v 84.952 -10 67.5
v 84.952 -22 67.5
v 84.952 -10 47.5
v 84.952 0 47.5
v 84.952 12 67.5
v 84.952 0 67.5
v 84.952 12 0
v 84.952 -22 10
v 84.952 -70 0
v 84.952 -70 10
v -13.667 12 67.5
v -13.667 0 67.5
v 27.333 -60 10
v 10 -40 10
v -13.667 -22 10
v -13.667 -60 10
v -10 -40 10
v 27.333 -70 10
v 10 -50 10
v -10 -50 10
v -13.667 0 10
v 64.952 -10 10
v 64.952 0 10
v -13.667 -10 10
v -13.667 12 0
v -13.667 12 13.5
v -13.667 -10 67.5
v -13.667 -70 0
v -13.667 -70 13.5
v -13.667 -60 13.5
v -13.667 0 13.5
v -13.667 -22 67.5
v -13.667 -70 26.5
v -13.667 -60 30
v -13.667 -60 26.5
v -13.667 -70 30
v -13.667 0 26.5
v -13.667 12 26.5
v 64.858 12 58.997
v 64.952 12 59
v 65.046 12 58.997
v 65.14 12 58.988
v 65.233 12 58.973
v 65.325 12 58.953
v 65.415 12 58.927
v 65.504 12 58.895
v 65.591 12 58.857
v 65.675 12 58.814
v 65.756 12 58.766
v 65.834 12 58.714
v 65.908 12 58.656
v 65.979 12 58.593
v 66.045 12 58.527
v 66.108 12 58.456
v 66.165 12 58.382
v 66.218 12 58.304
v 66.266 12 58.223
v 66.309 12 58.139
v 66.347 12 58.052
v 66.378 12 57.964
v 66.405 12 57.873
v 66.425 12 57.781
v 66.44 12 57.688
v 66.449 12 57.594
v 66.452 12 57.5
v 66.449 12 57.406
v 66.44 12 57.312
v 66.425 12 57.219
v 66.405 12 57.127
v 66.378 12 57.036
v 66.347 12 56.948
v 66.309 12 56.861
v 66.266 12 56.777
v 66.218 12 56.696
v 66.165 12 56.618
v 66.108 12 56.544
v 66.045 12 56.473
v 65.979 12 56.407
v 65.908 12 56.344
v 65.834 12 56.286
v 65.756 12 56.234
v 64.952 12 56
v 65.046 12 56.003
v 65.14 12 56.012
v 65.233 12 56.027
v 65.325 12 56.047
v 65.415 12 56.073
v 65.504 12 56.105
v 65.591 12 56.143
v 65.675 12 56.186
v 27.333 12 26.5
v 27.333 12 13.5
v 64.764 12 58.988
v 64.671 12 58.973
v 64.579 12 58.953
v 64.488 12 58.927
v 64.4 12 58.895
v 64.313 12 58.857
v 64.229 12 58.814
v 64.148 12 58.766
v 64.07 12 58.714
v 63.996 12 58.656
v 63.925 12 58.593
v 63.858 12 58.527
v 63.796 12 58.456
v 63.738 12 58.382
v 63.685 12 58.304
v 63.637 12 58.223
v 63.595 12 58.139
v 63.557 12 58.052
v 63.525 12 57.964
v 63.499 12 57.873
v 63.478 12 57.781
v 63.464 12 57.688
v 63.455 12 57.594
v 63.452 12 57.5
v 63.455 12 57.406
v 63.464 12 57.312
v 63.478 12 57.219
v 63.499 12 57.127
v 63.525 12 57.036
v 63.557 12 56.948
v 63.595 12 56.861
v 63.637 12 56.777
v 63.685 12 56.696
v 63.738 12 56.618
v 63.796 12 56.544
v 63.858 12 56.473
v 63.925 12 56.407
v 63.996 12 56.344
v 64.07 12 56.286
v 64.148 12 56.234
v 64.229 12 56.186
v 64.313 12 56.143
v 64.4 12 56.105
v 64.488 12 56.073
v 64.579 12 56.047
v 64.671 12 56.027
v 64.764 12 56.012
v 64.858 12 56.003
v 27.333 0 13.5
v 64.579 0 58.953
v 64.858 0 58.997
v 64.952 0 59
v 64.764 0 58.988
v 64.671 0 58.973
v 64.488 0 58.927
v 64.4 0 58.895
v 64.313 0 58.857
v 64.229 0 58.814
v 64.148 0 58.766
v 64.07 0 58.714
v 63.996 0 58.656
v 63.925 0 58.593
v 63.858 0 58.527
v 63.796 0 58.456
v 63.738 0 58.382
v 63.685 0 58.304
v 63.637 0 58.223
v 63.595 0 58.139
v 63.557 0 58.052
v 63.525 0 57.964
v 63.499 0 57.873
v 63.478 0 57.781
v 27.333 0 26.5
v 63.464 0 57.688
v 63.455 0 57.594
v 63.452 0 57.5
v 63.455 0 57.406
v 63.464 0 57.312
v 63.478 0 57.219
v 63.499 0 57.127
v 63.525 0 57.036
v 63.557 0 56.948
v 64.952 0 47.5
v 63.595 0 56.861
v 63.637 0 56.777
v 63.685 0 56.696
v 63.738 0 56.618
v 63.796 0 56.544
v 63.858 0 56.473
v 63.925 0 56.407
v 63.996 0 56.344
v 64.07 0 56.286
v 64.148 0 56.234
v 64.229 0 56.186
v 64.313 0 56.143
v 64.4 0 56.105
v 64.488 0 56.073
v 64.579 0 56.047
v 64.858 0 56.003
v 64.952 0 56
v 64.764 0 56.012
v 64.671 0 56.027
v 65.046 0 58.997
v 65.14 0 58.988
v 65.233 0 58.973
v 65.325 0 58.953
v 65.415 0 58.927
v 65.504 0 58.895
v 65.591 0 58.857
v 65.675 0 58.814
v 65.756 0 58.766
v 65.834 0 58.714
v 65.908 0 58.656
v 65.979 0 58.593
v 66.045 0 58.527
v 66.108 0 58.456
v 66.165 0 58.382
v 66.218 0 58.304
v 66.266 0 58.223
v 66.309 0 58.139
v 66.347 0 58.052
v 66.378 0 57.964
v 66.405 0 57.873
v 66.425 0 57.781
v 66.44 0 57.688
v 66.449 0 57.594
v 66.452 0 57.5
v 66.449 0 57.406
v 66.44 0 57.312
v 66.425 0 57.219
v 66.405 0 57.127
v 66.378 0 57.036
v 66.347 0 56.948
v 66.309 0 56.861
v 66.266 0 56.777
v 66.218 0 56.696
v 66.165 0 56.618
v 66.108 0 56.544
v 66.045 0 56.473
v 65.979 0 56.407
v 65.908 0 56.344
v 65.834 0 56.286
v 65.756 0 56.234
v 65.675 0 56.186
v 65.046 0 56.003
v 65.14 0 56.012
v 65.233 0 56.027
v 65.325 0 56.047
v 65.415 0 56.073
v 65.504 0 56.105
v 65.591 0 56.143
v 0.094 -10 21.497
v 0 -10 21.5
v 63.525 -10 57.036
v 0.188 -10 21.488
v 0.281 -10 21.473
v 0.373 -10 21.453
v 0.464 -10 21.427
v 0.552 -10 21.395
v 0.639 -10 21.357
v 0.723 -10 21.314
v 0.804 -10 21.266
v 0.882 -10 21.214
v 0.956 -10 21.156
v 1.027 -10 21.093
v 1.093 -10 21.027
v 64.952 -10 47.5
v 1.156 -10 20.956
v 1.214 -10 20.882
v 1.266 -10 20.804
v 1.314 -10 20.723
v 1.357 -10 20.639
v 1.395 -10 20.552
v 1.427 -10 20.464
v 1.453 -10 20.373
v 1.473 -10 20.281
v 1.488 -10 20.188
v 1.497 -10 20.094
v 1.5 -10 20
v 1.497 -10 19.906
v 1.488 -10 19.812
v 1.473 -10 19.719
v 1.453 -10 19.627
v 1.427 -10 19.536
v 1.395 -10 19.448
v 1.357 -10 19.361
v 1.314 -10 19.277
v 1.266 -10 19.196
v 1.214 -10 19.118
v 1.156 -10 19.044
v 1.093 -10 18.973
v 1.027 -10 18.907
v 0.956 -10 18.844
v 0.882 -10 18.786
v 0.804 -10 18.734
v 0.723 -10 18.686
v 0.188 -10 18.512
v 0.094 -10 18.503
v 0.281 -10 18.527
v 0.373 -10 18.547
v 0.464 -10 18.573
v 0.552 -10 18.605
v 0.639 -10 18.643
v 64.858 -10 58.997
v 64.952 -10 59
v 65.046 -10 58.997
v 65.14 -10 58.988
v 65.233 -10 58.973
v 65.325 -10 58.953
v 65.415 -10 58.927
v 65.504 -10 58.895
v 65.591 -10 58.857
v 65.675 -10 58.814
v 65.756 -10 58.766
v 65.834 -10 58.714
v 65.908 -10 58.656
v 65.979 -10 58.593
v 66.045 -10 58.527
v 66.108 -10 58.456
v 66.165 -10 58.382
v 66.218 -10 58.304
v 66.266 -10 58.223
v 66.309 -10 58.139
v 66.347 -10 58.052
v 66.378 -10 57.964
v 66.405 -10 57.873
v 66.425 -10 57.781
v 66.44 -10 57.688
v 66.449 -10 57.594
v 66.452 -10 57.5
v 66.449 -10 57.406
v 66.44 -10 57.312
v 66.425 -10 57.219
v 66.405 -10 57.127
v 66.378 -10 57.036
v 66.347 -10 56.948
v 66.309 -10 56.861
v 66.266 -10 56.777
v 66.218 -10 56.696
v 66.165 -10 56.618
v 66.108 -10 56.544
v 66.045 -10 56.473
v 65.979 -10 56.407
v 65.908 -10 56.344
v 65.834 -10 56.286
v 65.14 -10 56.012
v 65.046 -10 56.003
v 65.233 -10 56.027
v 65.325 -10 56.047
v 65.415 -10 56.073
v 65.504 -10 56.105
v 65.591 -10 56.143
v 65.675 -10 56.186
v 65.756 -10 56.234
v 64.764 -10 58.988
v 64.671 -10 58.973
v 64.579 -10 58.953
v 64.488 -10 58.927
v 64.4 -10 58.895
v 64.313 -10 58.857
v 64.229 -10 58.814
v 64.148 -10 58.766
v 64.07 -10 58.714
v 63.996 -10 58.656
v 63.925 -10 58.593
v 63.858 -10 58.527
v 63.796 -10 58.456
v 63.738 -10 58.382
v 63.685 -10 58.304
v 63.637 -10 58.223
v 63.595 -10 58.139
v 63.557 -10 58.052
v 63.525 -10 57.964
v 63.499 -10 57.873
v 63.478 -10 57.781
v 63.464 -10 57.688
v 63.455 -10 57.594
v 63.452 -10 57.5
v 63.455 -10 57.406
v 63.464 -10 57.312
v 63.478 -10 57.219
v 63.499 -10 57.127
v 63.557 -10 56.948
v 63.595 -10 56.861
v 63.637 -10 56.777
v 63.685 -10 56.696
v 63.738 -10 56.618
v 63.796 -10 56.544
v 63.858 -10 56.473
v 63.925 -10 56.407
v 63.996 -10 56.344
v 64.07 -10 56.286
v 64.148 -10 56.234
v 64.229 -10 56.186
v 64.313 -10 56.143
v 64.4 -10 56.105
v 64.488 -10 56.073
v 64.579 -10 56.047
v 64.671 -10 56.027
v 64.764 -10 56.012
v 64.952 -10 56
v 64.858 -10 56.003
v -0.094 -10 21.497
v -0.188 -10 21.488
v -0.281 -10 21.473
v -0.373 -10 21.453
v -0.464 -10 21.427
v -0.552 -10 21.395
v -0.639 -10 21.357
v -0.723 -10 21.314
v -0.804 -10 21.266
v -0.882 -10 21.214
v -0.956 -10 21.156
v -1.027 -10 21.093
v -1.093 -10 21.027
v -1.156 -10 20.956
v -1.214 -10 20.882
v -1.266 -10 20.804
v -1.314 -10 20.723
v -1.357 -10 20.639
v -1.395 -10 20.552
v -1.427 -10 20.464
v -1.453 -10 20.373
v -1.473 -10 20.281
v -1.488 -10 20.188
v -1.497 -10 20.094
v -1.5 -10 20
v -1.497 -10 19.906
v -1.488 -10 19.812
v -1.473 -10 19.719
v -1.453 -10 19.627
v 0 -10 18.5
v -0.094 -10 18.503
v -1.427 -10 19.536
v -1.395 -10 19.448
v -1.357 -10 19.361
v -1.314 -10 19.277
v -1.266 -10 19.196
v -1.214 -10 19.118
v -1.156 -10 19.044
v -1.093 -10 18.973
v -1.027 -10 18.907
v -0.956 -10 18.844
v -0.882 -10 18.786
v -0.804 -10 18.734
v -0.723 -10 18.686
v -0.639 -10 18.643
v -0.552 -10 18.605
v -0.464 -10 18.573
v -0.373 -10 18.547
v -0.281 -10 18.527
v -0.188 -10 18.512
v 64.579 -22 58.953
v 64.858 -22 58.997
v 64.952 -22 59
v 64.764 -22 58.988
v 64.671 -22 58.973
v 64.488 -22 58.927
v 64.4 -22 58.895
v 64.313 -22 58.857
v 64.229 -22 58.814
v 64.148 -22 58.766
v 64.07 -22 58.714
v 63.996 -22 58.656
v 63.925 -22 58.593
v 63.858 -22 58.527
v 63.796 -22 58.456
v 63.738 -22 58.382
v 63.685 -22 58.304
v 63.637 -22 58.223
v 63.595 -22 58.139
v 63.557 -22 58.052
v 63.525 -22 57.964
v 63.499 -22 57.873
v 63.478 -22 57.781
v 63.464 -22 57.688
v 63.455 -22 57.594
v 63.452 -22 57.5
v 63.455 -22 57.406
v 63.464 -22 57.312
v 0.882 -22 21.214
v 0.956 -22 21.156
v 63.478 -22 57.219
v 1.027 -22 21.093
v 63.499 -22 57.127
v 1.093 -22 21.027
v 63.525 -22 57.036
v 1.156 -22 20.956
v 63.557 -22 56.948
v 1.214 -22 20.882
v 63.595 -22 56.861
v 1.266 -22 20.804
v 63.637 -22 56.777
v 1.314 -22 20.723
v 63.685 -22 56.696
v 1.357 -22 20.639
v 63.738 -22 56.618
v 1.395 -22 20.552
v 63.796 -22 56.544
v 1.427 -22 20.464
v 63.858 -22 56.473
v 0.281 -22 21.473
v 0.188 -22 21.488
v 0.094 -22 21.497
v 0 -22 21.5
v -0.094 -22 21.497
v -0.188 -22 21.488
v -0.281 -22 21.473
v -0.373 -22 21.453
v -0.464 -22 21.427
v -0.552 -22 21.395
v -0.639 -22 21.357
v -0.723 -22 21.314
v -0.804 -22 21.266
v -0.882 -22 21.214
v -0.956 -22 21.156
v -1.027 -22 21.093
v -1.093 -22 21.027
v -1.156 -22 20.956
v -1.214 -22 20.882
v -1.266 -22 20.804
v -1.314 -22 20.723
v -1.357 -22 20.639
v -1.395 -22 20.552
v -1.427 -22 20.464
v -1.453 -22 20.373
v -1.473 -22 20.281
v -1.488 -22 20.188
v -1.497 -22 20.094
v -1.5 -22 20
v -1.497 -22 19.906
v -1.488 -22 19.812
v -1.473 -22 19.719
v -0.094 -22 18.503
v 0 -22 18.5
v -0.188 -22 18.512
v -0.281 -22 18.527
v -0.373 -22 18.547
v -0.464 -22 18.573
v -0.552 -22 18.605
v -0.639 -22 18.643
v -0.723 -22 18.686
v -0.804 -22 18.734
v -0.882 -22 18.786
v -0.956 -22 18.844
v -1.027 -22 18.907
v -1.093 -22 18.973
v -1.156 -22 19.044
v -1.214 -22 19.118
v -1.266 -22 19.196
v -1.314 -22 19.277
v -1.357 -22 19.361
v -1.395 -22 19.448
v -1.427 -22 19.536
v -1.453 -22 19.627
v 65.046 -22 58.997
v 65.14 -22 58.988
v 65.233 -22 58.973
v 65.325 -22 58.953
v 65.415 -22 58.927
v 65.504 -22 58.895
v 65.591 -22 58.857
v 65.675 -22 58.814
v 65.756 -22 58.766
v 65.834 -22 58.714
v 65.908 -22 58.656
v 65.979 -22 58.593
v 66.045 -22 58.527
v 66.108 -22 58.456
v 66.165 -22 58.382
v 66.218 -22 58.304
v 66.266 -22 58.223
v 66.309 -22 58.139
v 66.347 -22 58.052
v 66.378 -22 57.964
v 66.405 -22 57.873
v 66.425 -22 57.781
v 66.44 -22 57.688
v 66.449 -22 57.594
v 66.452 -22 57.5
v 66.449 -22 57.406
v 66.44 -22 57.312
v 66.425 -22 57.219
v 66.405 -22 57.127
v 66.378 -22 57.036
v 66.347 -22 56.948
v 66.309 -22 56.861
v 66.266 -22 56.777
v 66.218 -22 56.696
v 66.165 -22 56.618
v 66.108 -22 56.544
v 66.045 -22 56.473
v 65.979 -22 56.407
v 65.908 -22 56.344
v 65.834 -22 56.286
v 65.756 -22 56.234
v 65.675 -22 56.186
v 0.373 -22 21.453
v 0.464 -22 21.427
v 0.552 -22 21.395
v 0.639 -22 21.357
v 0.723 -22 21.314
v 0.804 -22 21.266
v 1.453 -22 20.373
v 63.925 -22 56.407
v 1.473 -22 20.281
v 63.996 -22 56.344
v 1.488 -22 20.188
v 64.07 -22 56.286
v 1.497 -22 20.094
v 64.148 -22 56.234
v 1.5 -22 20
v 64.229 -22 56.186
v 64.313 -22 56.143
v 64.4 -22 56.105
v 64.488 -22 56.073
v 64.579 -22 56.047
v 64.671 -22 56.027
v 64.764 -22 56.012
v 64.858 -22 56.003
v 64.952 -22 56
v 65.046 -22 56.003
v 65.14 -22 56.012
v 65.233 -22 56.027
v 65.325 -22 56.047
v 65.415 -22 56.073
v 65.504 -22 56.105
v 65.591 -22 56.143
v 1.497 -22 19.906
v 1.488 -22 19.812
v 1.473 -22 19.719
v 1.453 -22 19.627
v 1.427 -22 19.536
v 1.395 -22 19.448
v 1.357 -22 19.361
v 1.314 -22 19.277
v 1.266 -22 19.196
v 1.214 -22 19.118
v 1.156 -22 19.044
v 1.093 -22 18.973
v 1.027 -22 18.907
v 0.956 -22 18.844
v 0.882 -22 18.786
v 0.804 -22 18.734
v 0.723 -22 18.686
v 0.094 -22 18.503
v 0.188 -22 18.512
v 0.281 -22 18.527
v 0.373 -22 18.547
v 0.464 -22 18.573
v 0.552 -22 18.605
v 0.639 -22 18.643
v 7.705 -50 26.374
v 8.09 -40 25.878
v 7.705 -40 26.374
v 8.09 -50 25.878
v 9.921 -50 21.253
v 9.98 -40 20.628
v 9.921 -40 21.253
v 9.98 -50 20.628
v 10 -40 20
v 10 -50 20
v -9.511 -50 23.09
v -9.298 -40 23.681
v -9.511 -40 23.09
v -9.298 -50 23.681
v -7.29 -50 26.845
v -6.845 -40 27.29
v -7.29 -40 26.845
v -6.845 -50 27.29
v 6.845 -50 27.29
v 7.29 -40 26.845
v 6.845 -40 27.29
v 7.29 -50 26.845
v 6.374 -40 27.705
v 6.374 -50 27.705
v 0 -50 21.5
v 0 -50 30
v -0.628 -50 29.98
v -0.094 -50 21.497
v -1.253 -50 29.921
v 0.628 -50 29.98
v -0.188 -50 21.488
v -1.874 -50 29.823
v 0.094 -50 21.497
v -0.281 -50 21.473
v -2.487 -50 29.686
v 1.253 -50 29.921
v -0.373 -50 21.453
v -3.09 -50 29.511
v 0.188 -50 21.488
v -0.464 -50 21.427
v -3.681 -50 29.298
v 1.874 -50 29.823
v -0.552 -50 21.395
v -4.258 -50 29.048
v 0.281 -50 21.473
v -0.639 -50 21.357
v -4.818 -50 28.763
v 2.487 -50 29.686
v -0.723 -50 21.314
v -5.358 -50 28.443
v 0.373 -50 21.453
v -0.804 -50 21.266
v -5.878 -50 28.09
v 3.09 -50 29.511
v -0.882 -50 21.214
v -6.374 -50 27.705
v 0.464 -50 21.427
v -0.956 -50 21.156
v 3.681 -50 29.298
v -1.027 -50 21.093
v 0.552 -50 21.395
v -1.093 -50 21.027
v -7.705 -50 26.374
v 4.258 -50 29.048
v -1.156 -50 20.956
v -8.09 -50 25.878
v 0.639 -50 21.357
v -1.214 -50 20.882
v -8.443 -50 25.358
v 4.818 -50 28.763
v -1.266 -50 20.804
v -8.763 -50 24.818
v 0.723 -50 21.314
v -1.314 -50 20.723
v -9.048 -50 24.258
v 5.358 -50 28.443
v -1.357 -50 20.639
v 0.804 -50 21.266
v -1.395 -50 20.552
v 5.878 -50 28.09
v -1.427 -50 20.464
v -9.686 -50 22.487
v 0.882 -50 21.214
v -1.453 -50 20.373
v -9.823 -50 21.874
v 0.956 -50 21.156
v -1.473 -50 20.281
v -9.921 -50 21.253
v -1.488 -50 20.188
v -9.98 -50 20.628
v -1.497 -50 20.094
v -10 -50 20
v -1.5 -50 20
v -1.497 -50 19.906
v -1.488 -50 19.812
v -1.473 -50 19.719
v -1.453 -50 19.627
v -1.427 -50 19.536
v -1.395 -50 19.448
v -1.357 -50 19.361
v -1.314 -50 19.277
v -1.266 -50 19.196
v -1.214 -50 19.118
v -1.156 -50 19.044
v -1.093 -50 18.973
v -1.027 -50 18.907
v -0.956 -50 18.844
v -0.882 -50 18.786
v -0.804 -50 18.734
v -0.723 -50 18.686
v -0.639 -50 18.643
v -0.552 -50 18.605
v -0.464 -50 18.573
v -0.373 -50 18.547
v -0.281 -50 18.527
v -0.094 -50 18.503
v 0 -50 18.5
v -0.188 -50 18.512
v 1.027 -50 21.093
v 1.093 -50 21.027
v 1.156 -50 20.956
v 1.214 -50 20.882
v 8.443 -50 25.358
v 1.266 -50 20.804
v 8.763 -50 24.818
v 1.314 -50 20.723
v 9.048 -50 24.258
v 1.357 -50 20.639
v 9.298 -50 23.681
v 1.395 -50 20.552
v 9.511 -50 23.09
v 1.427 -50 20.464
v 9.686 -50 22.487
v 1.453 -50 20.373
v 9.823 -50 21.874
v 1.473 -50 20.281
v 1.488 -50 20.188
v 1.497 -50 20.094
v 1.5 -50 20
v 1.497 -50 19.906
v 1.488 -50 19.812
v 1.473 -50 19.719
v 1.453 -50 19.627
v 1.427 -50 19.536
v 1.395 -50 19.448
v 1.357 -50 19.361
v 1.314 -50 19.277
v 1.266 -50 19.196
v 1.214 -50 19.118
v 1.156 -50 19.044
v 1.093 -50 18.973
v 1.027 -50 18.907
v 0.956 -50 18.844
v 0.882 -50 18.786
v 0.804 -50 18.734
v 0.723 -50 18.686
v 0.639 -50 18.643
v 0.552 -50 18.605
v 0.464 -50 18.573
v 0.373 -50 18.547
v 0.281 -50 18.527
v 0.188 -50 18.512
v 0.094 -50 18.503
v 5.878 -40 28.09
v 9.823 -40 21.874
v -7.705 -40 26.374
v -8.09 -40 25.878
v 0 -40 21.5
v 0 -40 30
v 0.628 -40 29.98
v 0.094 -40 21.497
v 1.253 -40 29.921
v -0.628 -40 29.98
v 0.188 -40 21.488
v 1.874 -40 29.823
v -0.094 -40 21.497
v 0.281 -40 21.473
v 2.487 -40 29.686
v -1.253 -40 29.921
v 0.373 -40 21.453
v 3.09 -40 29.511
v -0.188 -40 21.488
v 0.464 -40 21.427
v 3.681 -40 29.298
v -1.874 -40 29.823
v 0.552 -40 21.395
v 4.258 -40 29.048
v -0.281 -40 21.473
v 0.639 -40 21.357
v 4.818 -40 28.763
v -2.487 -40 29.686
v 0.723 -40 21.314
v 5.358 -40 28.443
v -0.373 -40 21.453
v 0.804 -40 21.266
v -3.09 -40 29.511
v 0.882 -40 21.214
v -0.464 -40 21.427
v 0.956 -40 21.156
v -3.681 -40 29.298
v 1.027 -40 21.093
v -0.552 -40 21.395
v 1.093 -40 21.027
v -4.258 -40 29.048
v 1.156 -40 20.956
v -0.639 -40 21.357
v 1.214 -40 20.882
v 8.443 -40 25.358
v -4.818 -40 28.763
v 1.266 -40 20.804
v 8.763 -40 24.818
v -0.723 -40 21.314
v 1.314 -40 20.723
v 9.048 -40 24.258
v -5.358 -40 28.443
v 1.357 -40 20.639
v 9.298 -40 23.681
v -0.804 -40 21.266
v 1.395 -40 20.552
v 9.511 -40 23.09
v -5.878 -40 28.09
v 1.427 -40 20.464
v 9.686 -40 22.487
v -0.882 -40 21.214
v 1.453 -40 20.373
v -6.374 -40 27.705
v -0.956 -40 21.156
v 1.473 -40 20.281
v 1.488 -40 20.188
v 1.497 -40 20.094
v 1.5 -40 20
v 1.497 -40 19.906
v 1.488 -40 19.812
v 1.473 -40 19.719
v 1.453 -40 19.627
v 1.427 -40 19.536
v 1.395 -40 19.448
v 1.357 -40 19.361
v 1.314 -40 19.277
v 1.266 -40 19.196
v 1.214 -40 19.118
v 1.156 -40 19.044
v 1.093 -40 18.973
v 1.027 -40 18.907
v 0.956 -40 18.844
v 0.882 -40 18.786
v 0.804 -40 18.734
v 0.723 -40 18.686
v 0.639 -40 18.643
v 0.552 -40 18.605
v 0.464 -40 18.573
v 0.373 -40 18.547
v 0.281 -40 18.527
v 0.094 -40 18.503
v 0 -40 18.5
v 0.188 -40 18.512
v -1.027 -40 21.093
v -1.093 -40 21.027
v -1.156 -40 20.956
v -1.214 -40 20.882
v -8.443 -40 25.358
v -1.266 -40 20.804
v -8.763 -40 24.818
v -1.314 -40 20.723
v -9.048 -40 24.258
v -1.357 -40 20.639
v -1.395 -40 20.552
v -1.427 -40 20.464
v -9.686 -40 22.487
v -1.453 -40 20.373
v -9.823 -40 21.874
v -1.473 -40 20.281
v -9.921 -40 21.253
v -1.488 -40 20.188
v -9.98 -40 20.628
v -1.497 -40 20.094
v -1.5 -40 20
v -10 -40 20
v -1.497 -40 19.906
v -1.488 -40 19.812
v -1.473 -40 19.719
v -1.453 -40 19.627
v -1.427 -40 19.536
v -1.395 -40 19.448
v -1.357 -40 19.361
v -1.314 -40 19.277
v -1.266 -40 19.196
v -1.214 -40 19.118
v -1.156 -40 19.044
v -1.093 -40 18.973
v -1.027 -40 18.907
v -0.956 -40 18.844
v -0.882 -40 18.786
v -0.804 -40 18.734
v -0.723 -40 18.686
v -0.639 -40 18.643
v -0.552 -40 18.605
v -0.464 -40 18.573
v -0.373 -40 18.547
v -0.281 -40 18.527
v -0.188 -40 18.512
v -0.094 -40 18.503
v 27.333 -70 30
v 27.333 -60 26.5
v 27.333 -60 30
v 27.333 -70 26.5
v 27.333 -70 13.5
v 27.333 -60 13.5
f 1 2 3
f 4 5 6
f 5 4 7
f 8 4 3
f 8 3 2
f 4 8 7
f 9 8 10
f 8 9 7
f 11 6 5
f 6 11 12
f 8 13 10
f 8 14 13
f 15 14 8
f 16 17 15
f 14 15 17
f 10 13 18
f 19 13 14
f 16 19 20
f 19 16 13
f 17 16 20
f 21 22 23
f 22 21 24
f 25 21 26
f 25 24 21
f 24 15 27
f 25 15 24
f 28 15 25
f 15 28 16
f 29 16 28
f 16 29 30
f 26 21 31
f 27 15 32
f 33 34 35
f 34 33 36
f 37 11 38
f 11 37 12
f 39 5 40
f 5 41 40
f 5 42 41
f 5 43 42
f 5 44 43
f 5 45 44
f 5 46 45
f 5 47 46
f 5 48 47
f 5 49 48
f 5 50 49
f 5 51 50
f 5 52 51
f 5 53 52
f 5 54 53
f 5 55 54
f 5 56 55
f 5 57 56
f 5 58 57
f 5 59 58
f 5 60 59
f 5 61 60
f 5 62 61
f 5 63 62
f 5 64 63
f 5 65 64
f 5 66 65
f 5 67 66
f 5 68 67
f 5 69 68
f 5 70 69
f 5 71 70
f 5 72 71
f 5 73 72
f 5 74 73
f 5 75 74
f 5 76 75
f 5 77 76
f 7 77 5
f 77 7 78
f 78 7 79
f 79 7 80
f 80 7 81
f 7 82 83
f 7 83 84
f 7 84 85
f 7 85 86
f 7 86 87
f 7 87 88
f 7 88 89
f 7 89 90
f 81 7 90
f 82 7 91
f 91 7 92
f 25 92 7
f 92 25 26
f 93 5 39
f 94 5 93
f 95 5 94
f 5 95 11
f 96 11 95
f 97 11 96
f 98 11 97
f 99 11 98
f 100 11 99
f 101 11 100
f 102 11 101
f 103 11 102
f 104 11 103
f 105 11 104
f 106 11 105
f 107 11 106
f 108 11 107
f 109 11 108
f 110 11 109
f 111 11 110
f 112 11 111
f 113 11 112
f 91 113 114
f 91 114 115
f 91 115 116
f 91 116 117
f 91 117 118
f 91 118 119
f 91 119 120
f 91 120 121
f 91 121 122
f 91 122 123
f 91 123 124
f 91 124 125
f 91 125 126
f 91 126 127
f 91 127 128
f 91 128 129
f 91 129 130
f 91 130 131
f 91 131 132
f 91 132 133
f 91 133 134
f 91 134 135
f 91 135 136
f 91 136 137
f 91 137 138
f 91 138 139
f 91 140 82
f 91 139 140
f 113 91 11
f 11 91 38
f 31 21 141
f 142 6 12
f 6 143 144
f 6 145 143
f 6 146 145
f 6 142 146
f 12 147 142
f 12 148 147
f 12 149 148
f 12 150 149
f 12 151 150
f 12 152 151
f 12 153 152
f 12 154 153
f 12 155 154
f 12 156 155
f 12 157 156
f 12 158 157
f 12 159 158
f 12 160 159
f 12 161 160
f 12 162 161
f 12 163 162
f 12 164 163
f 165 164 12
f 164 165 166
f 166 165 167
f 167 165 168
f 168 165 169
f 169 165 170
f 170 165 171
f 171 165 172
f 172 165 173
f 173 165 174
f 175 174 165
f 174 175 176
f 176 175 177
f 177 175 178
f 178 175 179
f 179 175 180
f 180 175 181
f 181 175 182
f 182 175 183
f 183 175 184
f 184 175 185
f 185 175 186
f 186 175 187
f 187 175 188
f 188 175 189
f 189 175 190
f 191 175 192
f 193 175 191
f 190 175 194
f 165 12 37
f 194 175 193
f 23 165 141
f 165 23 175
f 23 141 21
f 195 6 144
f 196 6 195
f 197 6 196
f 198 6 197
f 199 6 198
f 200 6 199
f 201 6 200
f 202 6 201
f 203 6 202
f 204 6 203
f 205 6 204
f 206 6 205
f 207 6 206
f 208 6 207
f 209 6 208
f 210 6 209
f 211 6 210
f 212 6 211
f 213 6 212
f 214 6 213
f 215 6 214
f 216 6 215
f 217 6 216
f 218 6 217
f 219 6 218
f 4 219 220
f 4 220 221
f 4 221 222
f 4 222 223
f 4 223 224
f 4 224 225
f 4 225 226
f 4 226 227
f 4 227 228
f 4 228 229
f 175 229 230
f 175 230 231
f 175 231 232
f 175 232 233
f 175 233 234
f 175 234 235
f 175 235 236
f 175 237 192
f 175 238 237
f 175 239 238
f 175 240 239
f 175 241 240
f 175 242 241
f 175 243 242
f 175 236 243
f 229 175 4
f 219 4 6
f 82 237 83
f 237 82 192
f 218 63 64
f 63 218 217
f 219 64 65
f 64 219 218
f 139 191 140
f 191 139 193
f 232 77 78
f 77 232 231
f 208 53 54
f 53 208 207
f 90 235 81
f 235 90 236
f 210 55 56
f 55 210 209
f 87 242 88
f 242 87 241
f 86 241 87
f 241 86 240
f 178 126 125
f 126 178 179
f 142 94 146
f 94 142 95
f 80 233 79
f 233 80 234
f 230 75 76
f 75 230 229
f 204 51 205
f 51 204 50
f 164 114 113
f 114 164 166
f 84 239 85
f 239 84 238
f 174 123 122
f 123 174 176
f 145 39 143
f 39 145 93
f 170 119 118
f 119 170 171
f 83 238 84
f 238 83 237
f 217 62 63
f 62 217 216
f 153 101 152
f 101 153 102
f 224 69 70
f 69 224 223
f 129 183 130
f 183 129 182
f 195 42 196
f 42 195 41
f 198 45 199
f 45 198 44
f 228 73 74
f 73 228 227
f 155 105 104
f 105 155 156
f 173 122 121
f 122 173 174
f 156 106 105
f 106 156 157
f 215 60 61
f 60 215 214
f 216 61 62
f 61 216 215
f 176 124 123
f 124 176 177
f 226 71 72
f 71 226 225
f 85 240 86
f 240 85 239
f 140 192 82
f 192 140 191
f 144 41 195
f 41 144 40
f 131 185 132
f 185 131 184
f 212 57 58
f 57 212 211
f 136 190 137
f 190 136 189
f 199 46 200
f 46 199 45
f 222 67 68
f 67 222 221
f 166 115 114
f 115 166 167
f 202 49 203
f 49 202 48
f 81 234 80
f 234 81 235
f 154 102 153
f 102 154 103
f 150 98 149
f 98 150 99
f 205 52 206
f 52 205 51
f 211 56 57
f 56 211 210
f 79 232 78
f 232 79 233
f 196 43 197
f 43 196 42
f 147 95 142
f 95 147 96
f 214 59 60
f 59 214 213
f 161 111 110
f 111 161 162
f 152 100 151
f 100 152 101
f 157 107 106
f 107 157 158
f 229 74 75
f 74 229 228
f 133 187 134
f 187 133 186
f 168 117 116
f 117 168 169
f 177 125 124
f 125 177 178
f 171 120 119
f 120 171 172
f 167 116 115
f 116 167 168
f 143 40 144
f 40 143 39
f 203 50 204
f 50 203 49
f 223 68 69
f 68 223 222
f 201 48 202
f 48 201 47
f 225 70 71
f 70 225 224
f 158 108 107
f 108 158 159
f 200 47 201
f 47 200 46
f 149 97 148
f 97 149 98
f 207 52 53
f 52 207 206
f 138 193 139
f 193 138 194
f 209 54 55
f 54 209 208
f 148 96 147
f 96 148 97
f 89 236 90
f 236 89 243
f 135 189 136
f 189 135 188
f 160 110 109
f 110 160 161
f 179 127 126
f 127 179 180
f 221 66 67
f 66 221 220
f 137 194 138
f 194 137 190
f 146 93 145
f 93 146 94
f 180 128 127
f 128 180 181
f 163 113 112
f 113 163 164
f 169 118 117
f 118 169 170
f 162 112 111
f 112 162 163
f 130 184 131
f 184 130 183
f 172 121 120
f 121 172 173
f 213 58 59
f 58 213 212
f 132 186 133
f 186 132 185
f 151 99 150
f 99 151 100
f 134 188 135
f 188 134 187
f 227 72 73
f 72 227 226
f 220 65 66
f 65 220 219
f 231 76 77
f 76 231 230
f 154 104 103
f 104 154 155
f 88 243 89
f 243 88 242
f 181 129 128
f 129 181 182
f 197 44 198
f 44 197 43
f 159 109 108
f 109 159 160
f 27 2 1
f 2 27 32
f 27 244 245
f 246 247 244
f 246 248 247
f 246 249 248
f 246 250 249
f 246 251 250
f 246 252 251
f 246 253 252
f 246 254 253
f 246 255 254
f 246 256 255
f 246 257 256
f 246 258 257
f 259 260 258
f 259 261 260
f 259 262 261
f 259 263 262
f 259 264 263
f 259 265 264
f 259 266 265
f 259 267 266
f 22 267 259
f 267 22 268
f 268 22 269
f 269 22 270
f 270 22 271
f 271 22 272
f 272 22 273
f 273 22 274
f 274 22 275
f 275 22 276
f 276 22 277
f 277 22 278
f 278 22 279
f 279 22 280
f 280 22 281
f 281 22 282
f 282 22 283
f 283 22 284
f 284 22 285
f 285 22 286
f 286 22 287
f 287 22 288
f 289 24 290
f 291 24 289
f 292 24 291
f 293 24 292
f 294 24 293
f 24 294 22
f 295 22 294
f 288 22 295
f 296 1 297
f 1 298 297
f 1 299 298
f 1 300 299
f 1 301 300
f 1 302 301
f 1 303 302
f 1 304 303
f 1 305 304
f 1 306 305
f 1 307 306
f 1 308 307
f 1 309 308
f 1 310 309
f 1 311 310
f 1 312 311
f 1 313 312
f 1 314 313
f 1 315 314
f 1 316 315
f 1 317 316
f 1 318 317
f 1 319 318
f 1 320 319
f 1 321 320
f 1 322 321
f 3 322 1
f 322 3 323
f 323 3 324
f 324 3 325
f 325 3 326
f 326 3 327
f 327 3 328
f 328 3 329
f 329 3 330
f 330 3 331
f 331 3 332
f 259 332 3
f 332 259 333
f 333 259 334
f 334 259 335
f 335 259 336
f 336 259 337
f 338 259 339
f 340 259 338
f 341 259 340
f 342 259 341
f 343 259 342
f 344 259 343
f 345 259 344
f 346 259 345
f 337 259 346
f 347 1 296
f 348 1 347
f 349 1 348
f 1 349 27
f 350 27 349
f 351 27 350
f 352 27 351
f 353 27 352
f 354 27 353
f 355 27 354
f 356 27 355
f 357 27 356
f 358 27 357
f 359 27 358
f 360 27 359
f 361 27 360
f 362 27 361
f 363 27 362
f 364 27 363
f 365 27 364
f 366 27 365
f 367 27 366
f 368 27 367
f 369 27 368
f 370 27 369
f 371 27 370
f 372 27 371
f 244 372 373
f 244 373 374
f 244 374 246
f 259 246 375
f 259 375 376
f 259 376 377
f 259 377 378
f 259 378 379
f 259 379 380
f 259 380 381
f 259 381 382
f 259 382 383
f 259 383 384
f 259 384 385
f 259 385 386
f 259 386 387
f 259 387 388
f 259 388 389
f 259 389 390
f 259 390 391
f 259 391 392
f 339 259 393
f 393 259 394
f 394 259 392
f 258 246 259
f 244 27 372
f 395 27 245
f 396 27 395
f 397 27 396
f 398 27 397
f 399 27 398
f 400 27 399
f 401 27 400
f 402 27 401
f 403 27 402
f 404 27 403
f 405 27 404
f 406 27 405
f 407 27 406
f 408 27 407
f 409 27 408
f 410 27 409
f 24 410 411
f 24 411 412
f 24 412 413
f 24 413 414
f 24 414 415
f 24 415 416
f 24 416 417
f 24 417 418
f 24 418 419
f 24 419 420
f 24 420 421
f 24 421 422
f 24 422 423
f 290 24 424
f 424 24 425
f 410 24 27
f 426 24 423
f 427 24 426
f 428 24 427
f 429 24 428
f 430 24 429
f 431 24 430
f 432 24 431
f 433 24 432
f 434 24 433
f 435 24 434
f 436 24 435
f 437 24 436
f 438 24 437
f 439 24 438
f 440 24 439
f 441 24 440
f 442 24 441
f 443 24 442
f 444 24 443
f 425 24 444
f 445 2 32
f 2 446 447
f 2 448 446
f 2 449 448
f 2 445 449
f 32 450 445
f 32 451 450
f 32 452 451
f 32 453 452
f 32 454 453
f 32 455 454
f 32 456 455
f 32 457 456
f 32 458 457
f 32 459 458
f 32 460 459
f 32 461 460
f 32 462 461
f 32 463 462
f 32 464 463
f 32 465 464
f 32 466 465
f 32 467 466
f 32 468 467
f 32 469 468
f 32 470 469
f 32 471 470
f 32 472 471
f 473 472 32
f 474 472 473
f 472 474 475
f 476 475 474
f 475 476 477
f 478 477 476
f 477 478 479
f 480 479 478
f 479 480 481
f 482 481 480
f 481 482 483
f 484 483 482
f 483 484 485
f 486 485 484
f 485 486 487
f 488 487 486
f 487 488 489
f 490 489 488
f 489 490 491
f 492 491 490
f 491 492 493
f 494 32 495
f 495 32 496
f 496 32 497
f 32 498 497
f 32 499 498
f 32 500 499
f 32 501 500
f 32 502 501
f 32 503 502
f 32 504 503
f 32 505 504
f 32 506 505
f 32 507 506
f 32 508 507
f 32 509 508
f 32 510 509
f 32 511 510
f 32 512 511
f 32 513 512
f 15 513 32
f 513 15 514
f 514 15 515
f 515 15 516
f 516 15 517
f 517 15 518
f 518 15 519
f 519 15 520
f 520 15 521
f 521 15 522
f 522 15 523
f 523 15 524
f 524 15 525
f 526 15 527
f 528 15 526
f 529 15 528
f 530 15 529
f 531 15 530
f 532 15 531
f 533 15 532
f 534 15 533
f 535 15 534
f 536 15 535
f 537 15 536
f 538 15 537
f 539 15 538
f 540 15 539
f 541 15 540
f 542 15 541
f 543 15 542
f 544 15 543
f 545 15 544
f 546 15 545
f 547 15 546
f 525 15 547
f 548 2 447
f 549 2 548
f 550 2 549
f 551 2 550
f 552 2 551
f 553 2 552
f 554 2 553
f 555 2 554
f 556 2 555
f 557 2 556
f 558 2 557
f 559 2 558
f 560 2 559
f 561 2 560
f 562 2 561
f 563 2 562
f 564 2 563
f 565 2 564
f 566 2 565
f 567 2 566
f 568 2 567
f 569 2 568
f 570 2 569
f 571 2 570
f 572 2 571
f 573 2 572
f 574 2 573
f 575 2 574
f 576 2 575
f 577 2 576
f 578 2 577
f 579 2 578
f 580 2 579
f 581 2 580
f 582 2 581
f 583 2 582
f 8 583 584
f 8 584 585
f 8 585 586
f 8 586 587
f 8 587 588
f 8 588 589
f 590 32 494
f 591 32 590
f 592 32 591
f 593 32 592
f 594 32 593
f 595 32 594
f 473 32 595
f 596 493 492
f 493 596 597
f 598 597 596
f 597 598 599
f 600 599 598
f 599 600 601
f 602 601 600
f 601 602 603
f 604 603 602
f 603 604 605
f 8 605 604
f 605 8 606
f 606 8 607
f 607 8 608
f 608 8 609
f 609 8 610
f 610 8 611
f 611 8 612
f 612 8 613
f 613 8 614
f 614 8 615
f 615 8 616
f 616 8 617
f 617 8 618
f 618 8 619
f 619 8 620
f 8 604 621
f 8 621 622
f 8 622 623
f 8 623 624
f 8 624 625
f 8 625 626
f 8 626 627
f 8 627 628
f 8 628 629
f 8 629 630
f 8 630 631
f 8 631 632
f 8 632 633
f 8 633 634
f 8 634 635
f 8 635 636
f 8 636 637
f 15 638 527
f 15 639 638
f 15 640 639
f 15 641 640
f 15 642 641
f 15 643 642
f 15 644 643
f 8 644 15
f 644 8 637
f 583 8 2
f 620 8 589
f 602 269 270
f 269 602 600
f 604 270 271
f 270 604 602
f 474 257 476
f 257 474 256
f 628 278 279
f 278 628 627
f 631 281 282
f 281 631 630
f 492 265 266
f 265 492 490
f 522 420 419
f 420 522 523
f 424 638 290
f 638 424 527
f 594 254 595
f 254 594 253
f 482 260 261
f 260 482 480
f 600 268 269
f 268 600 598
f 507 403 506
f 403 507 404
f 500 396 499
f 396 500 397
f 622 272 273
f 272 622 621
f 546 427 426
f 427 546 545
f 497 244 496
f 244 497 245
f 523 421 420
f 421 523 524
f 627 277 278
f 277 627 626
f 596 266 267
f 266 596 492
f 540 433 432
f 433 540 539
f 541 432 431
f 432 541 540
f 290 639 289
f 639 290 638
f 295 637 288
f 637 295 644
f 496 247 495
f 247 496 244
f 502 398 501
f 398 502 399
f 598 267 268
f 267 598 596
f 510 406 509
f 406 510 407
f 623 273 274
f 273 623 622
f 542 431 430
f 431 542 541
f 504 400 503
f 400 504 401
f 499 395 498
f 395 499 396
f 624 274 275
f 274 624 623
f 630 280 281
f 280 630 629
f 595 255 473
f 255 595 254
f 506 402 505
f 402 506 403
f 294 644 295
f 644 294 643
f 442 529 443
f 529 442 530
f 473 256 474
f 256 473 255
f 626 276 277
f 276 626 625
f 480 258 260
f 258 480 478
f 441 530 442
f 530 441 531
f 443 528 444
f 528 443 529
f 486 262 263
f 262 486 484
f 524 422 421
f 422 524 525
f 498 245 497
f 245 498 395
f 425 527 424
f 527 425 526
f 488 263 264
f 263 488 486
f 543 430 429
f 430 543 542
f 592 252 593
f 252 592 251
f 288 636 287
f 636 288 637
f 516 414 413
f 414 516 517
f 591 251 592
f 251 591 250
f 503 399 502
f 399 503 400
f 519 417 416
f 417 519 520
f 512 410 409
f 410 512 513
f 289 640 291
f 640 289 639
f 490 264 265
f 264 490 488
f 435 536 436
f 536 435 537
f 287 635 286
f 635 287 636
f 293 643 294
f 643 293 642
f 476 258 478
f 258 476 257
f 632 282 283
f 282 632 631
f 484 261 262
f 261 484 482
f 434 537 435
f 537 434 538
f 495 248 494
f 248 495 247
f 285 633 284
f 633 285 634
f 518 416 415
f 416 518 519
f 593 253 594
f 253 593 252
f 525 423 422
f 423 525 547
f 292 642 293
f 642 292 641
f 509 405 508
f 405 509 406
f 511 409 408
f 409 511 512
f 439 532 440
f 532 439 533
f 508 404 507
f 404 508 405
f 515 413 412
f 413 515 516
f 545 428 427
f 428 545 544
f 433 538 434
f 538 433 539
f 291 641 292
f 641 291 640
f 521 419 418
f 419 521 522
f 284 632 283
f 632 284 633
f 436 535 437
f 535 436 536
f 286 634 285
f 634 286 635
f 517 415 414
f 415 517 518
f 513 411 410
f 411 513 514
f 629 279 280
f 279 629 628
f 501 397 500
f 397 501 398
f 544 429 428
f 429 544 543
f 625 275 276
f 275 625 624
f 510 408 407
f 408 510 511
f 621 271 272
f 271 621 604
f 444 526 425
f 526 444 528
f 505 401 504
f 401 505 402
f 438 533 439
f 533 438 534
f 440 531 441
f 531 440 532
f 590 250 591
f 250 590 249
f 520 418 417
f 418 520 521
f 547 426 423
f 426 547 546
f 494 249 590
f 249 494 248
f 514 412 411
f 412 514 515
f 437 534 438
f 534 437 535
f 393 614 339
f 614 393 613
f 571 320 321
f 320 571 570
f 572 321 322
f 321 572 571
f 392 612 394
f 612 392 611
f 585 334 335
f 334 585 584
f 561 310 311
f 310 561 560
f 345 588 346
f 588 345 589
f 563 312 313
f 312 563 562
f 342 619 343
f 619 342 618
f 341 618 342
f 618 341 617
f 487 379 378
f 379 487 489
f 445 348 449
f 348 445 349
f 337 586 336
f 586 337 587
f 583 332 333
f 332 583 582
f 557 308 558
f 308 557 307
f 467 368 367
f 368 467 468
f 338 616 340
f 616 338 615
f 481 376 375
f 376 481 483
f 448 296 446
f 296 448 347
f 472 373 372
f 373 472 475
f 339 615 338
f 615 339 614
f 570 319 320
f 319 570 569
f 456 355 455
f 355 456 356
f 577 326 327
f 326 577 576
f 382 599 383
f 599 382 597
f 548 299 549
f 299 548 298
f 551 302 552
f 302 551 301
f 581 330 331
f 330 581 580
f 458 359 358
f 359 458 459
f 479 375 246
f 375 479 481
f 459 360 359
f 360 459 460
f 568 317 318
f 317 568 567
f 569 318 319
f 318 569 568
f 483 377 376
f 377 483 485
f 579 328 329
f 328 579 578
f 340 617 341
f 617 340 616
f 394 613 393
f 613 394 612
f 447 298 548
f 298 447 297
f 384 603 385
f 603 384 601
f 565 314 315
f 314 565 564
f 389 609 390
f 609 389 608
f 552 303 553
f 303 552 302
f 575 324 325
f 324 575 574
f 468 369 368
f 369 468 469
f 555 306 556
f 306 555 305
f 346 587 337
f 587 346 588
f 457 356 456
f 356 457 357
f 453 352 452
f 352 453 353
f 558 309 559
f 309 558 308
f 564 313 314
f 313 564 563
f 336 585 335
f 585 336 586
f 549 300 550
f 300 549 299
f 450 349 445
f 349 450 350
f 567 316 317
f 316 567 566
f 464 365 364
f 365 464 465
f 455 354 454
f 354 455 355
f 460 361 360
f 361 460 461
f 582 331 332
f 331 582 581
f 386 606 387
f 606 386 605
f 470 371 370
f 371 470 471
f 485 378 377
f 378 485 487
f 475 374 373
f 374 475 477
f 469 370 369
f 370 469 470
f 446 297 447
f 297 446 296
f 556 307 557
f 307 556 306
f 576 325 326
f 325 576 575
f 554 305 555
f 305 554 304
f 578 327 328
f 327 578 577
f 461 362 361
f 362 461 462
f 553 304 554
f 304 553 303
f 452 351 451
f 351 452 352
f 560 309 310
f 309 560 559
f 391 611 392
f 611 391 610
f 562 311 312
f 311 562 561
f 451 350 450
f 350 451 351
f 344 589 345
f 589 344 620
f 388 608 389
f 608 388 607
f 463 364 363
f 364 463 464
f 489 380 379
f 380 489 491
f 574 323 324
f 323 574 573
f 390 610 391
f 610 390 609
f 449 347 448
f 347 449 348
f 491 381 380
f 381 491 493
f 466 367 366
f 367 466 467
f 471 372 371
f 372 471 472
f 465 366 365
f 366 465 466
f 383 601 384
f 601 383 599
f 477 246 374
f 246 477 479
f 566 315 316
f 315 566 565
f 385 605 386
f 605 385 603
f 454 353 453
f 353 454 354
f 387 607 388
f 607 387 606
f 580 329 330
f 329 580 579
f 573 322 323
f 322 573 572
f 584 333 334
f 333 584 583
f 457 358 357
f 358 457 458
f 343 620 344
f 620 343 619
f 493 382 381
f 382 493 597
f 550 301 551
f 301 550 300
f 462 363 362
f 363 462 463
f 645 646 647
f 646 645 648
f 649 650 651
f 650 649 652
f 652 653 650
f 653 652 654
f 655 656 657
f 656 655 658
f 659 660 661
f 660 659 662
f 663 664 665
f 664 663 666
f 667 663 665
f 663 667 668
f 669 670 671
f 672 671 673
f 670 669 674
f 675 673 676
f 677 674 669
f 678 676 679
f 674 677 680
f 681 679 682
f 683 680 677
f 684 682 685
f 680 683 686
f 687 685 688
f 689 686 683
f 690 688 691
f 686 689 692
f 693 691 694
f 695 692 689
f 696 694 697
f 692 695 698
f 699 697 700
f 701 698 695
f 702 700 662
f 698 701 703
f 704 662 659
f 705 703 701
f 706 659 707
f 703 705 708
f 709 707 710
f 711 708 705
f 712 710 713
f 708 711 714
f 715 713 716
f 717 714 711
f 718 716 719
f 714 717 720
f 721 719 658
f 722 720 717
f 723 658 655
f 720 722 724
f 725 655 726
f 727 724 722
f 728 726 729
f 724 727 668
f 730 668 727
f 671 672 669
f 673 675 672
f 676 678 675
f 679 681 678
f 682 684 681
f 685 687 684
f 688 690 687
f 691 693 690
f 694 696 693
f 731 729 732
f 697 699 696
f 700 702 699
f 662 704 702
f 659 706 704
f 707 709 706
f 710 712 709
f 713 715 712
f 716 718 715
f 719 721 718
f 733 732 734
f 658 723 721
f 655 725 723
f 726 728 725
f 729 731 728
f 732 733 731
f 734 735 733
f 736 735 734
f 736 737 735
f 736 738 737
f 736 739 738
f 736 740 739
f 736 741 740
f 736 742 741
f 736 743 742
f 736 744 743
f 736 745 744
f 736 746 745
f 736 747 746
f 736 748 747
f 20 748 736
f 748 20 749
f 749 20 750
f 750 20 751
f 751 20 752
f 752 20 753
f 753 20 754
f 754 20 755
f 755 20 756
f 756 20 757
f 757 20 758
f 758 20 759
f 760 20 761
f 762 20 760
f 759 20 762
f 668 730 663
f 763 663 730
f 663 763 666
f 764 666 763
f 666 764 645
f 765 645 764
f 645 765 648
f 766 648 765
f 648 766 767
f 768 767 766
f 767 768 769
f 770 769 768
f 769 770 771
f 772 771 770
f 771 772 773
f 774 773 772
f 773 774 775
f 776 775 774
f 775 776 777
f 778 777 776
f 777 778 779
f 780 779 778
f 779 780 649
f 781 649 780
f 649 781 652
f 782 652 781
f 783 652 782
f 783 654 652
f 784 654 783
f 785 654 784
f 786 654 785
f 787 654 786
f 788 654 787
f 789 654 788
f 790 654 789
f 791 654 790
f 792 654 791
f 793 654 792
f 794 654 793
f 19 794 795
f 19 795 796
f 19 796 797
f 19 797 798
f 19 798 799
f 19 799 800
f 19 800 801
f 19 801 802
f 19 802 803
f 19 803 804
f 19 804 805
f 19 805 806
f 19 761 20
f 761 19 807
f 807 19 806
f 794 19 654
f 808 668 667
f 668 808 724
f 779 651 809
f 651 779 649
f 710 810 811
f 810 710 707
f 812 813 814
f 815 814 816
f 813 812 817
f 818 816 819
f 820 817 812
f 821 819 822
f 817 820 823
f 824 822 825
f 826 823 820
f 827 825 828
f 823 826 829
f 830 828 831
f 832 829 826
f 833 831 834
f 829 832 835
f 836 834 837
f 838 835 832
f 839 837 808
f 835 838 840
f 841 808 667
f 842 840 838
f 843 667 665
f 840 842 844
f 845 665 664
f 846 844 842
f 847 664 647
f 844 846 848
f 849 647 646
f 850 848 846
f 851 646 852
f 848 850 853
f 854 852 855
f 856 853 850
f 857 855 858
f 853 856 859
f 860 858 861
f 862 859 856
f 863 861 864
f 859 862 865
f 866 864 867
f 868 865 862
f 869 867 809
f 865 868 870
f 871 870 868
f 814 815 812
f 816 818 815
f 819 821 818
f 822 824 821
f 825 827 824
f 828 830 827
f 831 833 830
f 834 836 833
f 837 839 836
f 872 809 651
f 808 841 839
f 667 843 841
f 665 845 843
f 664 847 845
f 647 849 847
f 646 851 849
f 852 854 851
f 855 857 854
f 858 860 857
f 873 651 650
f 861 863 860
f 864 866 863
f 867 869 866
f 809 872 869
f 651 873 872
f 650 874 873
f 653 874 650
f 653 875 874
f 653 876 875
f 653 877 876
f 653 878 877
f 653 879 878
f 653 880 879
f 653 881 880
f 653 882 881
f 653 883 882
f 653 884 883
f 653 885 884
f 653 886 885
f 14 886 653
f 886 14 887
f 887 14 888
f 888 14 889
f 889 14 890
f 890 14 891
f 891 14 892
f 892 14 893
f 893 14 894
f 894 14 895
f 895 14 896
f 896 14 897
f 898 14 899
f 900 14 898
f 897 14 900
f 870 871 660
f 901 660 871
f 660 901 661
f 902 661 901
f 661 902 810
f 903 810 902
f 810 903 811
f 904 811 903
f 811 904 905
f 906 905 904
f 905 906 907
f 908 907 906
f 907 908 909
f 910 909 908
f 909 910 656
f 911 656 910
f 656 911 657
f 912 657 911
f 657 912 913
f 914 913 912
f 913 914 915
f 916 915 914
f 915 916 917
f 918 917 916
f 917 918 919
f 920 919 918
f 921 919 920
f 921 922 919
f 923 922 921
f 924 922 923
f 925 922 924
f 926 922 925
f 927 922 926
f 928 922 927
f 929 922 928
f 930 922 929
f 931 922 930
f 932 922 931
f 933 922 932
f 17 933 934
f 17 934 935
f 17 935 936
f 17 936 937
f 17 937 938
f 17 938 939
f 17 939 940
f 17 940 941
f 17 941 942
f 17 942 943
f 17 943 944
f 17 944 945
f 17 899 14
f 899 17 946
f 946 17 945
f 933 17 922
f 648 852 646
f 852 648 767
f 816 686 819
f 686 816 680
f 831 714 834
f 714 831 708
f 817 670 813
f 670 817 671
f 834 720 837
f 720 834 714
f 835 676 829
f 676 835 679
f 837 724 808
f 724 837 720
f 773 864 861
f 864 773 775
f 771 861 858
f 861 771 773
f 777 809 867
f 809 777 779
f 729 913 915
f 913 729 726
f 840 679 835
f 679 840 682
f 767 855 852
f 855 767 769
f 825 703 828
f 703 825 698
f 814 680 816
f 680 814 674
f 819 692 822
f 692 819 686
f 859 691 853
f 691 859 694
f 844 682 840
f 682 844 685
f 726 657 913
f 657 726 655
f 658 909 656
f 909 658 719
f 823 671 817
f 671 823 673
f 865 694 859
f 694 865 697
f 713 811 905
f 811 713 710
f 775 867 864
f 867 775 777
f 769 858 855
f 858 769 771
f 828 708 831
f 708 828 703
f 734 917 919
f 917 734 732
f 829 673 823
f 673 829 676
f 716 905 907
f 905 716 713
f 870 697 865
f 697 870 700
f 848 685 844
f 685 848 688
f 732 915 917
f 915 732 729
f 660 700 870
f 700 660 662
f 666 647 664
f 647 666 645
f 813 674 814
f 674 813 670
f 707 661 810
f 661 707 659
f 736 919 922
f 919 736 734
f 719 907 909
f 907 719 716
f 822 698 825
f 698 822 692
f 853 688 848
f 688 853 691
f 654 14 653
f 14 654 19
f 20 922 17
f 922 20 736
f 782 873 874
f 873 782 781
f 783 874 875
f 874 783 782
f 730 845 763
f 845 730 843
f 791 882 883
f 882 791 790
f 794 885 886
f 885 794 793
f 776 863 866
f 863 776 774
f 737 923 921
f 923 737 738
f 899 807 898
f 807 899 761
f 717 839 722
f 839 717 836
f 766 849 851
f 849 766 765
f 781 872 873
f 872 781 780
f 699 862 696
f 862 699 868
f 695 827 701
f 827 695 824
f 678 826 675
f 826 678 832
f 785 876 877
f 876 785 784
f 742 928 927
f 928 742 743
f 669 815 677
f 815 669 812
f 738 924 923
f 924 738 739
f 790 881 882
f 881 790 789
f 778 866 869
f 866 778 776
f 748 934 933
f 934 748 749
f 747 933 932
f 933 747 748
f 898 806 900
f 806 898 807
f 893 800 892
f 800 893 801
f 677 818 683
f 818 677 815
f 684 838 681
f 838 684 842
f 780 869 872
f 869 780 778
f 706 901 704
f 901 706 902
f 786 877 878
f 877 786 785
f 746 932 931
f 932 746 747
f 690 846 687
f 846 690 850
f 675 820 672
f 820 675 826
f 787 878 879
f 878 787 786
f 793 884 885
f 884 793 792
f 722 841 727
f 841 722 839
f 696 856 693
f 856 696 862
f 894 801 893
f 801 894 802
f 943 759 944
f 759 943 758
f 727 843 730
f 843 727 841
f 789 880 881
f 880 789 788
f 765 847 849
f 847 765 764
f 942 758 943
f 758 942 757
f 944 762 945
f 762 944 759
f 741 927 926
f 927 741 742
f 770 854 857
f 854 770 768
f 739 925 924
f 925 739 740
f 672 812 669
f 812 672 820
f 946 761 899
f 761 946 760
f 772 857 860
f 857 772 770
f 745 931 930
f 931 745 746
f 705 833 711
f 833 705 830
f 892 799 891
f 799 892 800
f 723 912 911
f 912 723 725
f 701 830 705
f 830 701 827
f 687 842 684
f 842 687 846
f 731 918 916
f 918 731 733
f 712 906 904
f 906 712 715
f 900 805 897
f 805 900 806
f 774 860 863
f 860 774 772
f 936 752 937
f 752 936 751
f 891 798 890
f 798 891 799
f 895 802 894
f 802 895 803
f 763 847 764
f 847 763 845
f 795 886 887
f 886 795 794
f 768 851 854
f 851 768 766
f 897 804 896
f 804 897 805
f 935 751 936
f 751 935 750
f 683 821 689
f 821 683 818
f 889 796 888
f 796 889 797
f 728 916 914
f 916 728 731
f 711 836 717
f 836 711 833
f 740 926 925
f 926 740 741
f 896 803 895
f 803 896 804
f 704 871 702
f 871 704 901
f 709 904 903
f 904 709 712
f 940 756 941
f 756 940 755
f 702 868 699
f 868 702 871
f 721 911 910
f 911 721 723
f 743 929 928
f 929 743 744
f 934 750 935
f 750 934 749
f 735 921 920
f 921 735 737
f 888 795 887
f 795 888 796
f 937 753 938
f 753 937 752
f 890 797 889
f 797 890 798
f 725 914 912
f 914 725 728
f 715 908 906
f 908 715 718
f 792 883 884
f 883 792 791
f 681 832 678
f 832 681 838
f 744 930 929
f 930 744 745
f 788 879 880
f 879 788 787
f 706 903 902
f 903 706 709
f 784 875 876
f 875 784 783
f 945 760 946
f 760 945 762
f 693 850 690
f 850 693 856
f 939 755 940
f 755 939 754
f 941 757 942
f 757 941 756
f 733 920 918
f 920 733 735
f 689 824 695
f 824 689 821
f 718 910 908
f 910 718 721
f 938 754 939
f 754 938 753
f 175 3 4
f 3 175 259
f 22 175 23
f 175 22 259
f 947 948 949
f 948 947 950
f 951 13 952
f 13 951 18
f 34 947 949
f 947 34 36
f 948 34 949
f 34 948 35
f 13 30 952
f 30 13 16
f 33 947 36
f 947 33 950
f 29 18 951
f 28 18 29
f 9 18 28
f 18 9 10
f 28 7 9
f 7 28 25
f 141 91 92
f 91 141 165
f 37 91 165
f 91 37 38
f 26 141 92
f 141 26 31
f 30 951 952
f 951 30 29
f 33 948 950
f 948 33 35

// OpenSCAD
// file: servo.scad
/*
A: 35mm
B: 30mm
C: 31mm
D: 13mm
E: 41mm
F: 19mm

40 degree on each side

29x13x30

*/
module baseServo() {
    sizeY = 13;
    baseHeight = 19;
    fixtureHeight = 31 - baseHeight;
    
    rotate([90, 0, 0])
    union() {
        // Tip
        cylinder((35-31), d=10);
        
        
        // Fixture
        translate([41/6, 0, -fixtureHeight / 2])
        cube([41, sizeY, fixtureHeight ], center=true);
        
        // Base
        translate([41/6, 0, -(fixtureHeight + baseHeight/2) ])
        cube([30, sizeY, baseHeight], center=true);
    }
}

/*
23.1x12x25.9

60 degree on each side
*/
module gripServo() {
    
}

baseServo();
// file: constant.scad
DEBUG = false;

$fn = DEBUG ? 0 : 100;

SEGMENT_WIDTH = 20;
BOLT_DIAMETER= 3;

SHORT = 75;
LONG = 175;
CLAW_WIDTH = 25;
THICKNESS = 10;

// Angles in degree
BOTTOM_SLOPE = 30;
TOP_SLOPE = 10;

CENTER = 50;

function getTopCoords(size, angle) =
	let(computedAngle = 90 + angle) [
		cos(computedAngle) * size,
		sin(computedAngle) * size
	];

function getBottomCoords(size, angle) = [
    cos(angle) * size,
    sin(angle) * size
];
// main file
include <constant.scad>
use <servo.scad>

SHOW_SERVO = false;

module bottomHinge(size, angle, thickness=1) {
    point = getBottomCoords(size, angle);
    
    coords = [
        [0, 0],
        [point.x, 0],
        point
    ];
    
    rotate([90, 0, 0])
    linear_extrude(thickness)
    difference() {
        minkowski() {
            polygon(coords);
            circle(d=SEGMENT_WIDTH);
        };
        circle(d=BOLT_DIAMETER);
        translate([point.x, point.y, 0])
            circle(d=BOLT_DIAMETER);
    };
}

module base() {
    point = getBottomCoords(SHORT, BOTTOM_SLOPE);

    // TODO: Use servo constants
    thickness = 31 - 19;
    
    front = -41 * 1/3;
    back = point.x + SEGMENT_WIDTH;

    sizeX = back - front;
    sizeY = CENTER + 2 * THICKNESS + thickness;
    sizeZ = point.y + SEGMENT_WIDTH;
    
    module leftWall() {
        difference() {
            translate([
                (back + front) / 2, 
                thickness / 2, 
                point.y / 2
            ]) 
                cube([sizeX, thickness, sizeZ], center=true);
            
            translate([0, thickness, 0])
                rotate([90, 0, 0])
                    cylinder(thickness, d=BOLT_DIAMETER);
            
            translate([point.x, thickness, point.y])
            rotate([90, 0, 0])
                cylinder(thickness, d=BOLT_DIAMETER);
        }
    }
    
    module leftJoin() {
        translate([
            back - SEGMENT_WIDTH / 2, 
            -THICKNESS / 2, 
            point.y / 2 - THICKNESS
        ])
            cube([
                SEGMENT_WIDTH, 
                THICKNESS, 
                sizeZ - SEGMENT_WIDTH
            ], center=true);
    }

    module rightWall() {
    	// TODO: Use servo constants
    	translate([
    		41 / 2 + front,
    		-THICKNESS / 2,
    		0
    	])
    	cube([
    		41,
    		THICKNESS, 
    		SEGMENT_WIDTH
    	], center=true);
    }
    
    module rightHinge() {
    	difference() {
            union() {
                rotate([90, 0, 0])
                    cylinder(THICKNESS, d=SEGMENT_WIDTH);
                translate([0, -THICKNESS / 2, -SEGMENT_WIDTH / 4])
                    cube([
                        SEGMENT_WIDTH, 
                        THICKNESS, 
                        SEGMENT_WIDTH / 2
                    ], center=true);
            }
            
            rotate([90, 0, 0])
                cylinder(THICKNESS, d=BOLT_DIAMETER);
        }
    }
    
    module bottom() {
        translate([
            (back + front) / 2, 
            thickness - sizeY / 2, 
            -3/2 * THICKNESS
        ])
            cube([sizeX, sizeY, THICKNESS], center=true);
    }
    
    rightServo = [0, -(CENTER + THICKNESS), 0];
    
    difference() {
        union() {
            leftWall();
            translate([0, -(THICKNESS + thickness), 0])
                leftWall();
            leftJoin();
            
            translate([0, -(CENTER - THICKNESS), 0])
                rightHinge();
            translate([0, -(CENTER + THICKNESS), 0])
                rightWall();
            bottom();
        }
        baseServo();
        translate(rightServo)
        rotate([180, 0, 0])
            baseServo();
    }
    
    if (SHOW_SERVO) {
        color("red") baseServo();
        
        color("red") 
        translate(rightServo)
        rotate([180, 0, 0])
            baseServo();
    }
}

translate([0, 0, 2 * THICKNESS])
    base();
